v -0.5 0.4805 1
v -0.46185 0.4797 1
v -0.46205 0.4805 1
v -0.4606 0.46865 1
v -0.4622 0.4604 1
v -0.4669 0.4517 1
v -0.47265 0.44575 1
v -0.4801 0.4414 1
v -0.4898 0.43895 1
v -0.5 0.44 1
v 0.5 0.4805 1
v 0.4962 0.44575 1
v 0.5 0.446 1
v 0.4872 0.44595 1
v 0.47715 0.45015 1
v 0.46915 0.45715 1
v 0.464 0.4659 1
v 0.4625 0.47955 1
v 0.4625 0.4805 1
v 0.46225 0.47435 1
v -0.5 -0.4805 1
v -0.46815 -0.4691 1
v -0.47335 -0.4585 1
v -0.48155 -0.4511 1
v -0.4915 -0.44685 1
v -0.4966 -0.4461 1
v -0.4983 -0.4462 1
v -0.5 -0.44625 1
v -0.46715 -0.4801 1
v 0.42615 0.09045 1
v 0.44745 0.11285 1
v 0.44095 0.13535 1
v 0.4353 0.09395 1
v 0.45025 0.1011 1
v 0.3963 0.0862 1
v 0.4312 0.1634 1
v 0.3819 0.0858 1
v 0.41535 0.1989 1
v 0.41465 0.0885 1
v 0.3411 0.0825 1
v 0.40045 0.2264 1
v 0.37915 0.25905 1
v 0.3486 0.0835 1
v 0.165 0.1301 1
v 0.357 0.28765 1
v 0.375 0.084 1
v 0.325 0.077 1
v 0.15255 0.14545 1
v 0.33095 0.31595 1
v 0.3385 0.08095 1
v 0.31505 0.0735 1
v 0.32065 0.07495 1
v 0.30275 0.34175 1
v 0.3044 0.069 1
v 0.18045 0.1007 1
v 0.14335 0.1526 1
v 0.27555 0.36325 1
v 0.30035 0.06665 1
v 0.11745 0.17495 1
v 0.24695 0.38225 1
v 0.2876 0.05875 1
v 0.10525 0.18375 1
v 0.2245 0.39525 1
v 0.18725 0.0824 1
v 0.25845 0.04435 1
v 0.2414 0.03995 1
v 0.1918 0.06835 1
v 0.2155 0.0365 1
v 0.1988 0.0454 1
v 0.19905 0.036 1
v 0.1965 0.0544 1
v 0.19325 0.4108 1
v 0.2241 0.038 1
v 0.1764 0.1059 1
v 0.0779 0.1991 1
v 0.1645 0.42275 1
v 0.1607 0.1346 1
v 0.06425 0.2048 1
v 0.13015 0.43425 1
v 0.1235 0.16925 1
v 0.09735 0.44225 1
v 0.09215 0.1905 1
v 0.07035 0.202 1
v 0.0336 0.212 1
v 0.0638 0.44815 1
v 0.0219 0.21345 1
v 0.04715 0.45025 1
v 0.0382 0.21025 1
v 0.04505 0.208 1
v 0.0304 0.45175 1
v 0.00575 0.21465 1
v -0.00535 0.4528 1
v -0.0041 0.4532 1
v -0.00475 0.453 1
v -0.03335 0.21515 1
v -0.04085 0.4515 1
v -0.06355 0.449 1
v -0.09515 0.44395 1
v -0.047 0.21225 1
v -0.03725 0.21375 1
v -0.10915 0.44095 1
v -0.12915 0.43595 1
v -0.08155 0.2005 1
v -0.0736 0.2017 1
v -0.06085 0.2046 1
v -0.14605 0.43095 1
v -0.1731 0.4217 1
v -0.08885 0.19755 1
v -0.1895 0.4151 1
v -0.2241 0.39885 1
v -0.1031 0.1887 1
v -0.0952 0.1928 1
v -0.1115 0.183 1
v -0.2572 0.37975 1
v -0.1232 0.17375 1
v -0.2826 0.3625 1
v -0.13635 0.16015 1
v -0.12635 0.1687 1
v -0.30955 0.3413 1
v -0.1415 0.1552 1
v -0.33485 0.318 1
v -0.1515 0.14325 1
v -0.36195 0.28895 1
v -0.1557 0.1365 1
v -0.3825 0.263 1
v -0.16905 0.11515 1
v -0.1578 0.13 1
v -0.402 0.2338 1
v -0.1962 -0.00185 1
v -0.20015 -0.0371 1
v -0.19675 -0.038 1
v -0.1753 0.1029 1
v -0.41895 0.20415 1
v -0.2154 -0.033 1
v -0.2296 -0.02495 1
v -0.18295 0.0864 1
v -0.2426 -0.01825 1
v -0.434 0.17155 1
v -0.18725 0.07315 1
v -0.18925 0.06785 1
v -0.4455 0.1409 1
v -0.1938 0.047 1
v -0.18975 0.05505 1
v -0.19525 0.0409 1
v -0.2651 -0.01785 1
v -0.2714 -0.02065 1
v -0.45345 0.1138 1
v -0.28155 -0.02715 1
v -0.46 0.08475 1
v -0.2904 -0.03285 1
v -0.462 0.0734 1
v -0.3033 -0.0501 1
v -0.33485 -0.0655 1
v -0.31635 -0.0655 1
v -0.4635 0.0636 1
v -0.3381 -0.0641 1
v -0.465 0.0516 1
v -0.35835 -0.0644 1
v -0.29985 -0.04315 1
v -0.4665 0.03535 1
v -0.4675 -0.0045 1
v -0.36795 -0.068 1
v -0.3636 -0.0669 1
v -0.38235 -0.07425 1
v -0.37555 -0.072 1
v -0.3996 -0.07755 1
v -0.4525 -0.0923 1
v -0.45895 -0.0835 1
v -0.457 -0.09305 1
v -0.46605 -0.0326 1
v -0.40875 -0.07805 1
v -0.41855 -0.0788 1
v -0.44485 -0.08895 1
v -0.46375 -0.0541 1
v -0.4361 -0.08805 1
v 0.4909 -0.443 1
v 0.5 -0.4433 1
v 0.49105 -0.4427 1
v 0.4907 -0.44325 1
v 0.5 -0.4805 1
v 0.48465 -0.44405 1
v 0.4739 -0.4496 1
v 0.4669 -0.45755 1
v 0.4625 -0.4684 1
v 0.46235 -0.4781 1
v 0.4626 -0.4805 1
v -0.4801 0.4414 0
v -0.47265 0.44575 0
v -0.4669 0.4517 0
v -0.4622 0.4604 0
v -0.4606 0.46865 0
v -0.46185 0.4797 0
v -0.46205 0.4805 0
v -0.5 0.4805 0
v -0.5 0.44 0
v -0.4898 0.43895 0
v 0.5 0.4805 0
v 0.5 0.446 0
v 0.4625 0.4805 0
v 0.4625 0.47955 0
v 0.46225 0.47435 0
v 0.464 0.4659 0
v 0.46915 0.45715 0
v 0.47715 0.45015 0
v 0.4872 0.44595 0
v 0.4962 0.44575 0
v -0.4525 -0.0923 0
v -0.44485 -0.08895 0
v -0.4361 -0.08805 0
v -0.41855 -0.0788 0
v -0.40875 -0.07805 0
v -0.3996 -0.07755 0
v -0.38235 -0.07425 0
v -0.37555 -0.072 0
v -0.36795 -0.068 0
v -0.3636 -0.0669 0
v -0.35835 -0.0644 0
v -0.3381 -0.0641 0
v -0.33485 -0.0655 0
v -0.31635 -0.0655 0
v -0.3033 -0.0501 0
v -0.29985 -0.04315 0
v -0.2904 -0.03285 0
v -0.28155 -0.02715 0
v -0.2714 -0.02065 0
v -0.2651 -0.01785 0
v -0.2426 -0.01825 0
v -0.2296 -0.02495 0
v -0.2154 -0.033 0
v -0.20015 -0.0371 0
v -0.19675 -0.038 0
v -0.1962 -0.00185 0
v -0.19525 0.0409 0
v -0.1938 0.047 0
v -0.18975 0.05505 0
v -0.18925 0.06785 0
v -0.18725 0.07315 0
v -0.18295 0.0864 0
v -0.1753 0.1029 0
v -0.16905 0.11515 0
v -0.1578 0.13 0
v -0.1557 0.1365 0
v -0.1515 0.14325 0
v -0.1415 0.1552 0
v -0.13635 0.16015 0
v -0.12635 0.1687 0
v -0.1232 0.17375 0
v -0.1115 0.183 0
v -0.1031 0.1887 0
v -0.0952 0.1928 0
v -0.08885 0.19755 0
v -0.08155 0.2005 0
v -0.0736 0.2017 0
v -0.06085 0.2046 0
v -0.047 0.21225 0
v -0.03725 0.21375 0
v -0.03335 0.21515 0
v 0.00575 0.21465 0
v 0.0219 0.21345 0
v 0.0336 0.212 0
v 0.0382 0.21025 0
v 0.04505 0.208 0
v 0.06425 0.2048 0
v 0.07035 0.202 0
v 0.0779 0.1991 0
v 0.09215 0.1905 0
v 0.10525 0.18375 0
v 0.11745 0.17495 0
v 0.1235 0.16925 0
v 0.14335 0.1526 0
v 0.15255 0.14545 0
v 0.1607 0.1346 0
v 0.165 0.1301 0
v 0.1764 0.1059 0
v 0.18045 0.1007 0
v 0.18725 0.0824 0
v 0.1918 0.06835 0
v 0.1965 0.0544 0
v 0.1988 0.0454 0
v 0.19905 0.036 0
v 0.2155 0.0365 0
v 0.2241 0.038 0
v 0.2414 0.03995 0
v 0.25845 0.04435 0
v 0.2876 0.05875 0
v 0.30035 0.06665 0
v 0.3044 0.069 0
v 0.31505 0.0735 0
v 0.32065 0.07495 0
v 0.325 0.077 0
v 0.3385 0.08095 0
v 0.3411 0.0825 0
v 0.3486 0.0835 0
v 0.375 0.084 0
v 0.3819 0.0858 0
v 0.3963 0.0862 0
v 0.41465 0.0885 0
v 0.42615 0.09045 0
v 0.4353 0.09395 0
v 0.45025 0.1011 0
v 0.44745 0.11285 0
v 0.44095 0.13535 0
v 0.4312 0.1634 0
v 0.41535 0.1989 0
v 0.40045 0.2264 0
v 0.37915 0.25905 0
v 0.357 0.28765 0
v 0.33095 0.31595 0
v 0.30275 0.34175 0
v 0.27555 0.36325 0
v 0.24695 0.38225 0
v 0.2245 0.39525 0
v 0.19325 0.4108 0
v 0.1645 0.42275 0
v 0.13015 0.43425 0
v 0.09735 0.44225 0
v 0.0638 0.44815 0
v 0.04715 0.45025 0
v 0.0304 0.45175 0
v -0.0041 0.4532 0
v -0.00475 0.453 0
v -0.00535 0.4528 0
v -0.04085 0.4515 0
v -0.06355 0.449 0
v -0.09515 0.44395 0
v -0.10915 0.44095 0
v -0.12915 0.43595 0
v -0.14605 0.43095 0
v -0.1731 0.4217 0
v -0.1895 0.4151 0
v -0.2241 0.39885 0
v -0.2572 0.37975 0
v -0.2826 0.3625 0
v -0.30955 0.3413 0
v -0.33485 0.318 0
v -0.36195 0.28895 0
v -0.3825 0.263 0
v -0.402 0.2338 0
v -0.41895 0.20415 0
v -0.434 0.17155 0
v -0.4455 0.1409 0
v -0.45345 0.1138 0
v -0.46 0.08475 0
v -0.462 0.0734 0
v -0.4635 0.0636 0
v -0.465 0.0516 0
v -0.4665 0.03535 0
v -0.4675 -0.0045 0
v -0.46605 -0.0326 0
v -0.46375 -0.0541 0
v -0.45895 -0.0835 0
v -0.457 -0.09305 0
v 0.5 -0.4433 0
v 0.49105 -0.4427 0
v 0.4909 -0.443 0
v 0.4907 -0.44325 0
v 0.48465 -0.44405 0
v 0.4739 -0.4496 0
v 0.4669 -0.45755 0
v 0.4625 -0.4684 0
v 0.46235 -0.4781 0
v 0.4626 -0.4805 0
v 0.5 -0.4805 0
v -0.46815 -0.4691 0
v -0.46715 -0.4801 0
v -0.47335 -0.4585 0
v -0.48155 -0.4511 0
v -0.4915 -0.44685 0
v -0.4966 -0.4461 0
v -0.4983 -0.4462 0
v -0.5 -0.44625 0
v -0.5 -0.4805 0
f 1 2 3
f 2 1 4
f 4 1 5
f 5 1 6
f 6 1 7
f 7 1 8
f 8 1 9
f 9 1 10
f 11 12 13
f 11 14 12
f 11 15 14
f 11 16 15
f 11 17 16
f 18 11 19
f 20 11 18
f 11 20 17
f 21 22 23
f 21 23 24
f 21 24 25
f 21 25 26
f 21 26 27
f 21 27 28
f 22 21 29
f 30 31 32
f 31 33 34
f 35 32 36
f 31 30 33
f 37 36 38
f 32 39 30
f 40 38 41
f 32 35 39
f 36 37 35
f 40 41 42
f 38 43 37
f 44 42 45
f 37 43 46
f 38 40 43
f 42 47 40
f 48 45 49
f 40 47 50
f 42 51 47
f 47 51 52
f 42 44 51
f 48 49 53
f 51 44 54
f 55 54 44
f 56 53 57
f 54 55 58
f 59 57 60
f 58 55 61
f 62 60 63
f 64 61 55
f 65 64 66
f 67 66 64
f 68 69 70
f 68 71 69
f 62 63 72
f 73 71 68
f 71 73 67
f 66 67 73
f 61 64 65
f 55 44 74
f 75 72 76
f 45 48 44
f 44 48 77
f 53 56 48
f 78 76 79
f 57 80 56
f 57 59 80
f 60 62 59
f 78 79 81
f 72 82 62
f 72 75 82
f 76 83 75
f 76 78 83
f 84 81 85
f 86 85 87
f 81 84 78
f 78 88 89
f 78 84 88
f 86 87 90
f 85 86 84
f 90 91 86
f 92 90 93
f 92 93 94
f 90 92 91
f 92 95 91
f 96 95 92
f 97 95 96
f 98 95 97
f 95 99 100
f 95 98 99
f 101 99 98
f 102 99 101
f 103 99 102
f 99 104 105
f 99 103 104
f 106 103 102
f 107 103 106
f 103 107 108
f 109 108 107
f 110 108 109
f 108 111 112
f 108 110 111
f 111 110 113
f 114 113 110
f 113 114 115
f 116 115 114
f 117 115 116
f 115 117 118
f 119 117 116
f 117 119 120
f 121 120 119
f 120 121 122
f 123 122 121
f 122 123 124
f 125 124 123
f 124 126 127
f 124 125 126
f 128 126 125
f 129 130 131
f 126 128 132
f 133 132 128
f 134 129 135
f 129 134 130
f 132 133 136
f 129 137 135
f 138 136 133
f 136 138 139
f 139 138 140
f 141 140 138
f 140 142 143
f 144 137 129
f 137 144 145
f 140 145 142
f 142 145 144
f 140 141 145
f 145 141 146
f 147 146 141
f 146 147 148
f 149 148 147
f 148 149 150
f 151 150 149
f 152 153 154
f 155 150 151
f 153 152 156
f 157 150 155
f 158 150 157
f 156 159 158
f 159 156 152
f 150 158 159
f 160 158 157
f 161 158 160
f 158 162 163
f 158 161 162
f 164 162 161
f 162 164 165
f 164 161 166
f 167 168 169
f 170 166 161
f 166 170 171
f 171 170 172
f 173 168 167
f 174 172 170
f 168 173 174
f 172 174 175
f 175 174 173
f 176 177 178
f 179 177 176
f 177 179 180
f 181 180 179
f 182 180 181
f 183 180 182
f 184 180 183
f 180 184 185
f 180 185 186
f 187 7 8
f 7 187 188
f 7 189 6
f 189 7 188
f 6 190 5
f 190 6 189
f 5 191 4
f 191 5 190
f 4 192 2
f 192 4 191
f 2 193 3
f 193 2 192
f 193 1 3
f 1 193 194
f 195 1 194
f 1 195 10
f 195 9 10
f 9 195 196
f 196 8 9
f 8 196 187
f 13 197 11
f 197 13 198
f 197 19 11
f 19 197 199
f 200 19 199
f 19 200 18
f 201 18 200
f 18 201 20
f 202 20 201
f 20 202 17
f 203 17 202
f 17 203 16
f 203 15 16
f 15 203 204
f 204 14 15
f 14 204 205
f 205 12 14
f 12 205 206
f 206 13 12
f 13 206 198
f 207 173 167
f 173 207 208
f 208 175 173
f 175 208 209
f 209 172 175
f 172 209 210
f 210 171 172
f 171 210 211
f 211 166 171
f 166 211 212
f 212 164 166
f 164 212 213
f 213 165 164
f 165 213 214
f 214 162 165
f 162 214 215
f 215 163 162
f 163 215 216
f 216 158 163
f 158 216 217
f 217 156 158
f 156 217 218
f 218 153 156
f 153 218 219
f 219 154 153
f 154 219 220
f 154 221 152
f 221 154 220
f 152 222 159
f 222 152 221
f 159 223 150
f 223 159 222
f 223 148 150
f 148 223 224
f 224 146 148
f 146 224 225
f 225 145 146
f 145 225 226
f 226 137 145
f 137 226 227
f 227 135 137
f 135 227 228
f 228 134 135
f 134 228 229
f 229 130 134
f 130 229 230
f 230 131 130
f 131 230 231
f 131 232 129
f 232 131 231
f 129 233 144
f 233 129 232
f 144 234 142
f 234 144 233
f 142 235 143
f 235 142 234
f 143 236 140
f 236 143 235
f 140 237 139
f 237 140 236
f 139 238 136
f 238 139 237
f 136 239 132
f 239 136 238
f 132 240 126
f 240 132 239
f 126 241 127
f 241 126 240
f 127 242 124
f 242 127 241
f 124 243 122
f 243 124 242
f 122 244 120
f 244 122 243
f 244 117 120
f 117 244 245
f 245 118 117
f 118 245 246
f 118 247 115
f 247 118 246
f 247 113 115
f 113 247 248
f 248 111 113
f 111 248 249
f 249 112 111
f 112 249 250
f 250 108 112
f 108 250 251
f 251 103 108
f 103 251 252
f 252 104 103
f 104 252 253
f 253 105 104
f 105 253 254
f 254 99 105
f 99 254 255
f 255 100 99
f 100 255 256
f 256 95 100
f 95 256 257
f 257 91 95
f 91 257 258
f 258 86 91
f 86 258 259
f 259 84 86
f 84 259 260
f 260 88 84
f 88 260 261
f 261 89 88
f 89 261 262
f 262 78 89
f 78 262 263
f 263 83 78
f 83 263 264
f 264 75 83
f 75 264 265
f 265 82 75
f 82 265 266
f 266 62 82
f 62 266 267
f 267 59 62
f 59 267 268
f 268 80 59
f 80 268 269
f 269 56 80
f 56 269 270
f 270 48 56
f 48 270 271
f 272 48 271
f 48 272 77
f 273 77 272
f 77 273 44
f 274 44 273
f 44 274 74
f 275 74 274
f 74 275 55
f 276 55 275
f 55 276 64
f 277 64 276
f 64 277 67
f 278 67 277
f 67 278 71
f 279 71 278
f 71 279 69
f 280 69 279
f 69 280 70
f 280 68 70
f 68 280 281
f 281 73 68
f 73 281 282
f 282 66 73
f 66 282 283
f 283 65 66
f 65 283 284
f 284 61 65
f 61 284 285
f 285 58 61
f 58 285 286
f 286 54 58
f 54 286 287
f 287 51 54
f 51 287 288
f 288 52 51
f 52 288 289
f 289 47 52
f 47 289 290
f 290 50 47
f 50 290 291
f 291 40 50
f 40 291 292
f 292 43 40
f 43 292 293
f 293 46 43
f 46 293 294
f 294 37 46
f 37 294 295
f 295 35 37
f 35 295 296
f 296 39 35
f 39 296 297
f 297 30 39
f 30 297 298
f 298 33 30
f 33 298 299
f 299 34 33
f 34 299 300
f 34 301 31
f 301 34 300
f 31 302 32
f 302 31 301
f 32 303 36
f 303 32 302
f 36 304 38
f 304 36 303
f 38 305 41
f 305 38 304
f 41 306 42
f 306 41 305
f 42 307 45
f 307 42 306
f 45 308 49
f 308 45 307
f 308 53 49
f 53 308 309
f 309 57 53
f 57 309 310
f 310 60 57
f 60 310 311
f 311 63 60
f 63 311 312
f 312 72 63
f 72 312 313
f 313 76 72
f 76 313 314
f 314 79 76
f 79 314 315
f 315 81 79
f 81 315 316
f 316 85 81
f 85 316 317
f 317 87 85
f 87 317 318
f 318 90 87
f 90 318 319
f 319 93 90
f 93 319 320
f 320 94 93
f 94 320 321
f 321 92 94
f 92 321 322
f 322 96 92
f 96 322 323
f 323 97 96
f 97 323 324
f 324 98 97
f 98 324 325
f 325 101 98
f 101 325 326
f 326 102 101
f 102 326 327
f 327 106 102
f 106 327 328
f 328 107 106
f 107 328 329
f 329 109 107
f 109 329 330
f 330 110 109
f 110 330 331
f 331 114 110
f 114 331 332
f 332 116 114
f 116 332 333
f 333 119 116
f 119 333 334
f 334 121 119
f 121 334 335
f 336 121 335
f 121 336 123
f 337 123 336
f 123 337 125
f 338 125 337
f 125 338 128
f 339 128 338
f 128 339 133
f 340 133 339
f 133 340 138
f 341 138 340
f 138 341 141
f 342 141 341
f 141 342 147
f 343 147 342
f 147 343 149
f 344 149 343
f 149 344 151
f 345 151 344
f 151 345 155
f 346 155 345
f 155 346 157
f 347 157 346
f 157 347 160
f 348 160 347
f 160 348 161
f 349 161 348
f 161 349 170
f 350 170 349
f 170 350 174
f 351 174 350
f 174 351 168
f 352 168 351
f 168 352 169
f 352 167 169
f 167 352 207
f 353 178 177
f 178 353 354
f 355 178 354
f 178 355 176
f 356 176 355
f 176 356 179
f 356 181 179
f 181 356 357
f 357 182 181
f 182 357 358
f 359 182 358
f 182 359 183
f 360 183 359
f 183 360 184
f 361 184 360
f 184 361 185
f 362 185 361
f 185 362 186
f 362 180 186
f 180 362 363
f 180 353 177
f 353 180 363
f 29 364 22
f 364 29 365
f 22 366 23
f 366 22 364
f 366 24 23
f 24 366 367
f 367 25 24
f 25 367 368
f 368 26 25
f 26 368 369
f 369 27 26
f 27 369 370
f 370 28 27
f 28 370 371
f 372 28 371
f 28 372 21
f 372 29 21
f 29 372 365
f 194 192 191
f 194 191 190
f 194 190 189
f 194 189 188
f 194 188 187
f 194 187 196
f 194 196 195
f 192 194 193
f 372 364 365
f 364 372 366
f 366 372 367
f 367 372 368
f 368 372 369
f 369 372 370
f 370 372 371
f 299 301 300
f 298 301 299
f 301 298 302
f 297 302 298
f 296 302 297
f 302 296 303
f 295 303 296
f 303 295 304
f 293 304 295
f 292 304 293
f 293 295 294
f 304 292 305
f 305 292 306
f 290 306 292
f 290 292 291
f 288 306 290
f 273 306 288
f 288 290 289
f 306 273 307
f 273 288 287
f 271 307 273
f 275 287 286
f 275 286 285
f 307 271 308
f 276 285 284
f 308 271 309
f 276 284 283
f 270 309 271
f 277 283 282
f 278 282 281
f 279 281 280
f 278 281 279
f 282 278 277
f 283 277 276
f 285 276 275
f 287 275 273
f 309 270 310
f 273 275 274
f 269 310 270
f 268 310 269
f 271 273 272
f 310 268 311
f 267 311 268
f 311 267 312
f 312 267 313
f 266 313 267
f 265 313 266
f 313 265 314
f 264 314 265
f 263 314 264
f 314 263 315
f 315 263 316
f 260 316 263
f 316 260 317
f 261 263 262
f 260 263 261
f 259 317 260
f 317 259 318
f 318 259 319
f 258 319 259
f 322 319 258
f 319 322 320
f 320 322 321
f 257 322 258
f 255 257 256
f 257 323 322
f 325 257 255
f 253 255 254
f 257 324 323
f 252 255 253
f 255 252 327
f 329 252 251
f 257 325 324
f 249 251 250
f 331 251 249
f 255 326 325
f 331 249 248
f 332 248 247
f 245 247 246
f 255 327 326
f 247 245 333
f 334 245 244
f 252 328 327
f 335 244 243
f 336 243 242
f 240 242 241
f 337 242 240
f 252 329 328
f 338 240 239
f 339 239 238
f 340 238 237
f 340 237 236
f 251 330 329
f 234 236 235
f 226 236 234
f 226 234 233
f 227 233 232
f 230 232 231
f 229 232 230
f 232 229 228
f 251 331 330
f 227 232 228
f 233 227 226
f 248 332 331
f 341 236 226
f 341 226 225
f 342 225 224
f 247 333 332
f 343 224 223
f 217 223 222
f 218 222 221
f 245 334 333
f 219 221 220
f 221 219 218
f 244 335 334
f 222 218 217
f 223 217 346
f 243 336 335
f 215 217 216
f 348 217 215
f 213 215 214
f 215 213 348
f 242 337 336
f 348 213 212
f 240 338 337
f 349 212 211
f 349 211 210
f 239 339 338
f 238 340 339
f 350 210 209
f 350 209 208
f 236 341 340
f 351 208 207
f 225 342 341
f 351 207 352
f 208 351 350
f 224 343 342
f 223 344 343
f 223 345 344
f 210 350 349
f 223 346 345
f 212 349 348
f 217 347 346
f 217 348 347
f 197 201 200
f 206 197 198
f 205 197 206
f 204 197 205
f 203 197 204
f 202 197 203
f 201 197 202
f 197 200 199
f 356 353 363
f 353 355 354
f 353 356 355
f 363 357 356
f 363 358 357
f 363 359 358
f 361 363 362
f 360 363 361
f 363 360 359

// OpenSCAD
module Hedwig3purple2_1()
{
 /* Generated by trace2scad version 20150415
    http://aggregate.org/MAKE/TRACE2SCAD/
    Optimized model has 188/2181 original points
 */
 color([0.5, 0.5, 0.5])
 assign(minx=0) /* polygon minx=0 */
 assign(miny=0) /* polygon miny=0 */
 assign(maxx=20000) /* polygon maxx=20000 */
 assign(maxy=19220) /* polygon maxy=19220 */
 assign(dx=maxx-minx)
 assign(dy=maxy-miny)
 assign(maxd=((dx>dy)?dx:dy))
 scale([1/maxd, 1/maxd, 1])
 translate([-minx-dx/2, -miny-dy/2, 0])
 linear_extrude(height=1, convexity=188)
 union() {
  union() {
   polygon([[0,18815],[0,18410],[204,18389],[398,18438],[547,18525],[662,18644],[756,18818],[788,18983],[763,19204],[759,19220],[0,19220]], convexity=5);
   polygon([[19250,19210],[19250,19201],[19245,19097],[19280,18928],[19383,18753],[19543,18613],[19744,18529],[19924,18525],[20000,18530],[20000,19220],[19250,19220]], convexity=7);
   polygon([[9905,18670],[9893,18666],[9183,18640],[8729,18590],[8097,18489],[7817,18429],[7417,18329],[7079,18229],[6538,18044],[6210,17912],[5518,17587],[4856,17205],[4348,16860],[3809,16436],[3303,15970],[2761,15389],[2350,14870],[1960,14286],[1621,13693],[1320,13041],[1090,12428],[931,11886],[800,11305],[760,11078],[730,10882],[700,10642],[670,10317],[650,9520],[679,8958],[725,8528],[821,7940],[860,7749],[950,7764],[1103,7831],[1278,7849],[1629,8034],[1825,8049],[2008,8059],[2353,8125],[2489,8170],[2641,8250],[2728,8272],[2833,8322],[3238,8328],[3303,8300],[3673,8300],[3934,8608],[4003,8747],[4192,8953],[4369,9067],[4572,9197],[4698,9253],[5148,9245],[5408,9111],[5692,8950],[5997,8868],[6065,8850],[6076,9573],[6095,10428],[6124,10550],[6205,10711],[6215,10967],[6255,11073],[6341,11338],[6494,11668],[6619,11913],[6844,12210],[6886,12340],[6970,12475],[7170,12714],[7273,12813],[7473,12984],[7536,13085],[7770,13270],[7938,13384],[8096,13466],[8223,13561],[8369,13620],[8528,13644],[8783,13702],[9060,13855],[9255,13885],[9333,13913],[10115,13903],[10438,13879],[10672,13850],[10764,13815],[10901,13770],[11285,13706],[11407,13650],[11558,13592],[11843,13420],[12105,13285],[12349,13109],[12470,12995],[12867,12662],[13051,12519],[13214,12302],[13300,12212],[13528,11728],[13609,11624],[13745,11258],[13836,10977],[13930,10698],[13976,10518],[13981,10330],[14310,10340],[14482,10370],[14828,10409],[15169,10497],[15752,10785],[16007,10943],[16088,10990],[16301,11080],[16413,11109],[16500,11150],[16770,11229],[16822,11260],[16972,11280],[17500,11290],[17638,11326],[17926,11334],[18293,11380],[18523,11419],[18706,11489],[19005,11632],[18949,11867],[18819,12317],[18624,12878],[18307,13588],[18009,14138],[17583,14791],[17140,15363],[16619,15929],[16055,16445],[15511,16875],[14939,17255],[14490,17515],[13865,17826],[13290,18065],[12603,18295],[11947,18455],[11276,18573],[10943,18615],[10608,18645],[9918,18674]], convexity=12);
   polygon([[19818,750],[19814,745],[19693,729],[19478,618],[19338,459],[19250,242],[19247,48],[19252,0],[20000,0],[20000,744],[19821,756]], convexity=6);
   polygon([[34,686],[0,685],[0,0],[657,8],[637,228],[533,440],[369,588],[170,673],[68,688]], convexity=6);
  }
 }
}

module Hedwig3purple2()
{
 /* all layers combined, scaled to within a 1mm cube */
 scale([1, 1, 1/1])
 difference() {
  union() {
   scale([1,1,2]) translate([0,0,-0.5]) Hedwig3purple2_1();
  }
  translate([0,0,-2]) cube([2,2,4],center=true);
 }
}
Hedwig3purple2();
